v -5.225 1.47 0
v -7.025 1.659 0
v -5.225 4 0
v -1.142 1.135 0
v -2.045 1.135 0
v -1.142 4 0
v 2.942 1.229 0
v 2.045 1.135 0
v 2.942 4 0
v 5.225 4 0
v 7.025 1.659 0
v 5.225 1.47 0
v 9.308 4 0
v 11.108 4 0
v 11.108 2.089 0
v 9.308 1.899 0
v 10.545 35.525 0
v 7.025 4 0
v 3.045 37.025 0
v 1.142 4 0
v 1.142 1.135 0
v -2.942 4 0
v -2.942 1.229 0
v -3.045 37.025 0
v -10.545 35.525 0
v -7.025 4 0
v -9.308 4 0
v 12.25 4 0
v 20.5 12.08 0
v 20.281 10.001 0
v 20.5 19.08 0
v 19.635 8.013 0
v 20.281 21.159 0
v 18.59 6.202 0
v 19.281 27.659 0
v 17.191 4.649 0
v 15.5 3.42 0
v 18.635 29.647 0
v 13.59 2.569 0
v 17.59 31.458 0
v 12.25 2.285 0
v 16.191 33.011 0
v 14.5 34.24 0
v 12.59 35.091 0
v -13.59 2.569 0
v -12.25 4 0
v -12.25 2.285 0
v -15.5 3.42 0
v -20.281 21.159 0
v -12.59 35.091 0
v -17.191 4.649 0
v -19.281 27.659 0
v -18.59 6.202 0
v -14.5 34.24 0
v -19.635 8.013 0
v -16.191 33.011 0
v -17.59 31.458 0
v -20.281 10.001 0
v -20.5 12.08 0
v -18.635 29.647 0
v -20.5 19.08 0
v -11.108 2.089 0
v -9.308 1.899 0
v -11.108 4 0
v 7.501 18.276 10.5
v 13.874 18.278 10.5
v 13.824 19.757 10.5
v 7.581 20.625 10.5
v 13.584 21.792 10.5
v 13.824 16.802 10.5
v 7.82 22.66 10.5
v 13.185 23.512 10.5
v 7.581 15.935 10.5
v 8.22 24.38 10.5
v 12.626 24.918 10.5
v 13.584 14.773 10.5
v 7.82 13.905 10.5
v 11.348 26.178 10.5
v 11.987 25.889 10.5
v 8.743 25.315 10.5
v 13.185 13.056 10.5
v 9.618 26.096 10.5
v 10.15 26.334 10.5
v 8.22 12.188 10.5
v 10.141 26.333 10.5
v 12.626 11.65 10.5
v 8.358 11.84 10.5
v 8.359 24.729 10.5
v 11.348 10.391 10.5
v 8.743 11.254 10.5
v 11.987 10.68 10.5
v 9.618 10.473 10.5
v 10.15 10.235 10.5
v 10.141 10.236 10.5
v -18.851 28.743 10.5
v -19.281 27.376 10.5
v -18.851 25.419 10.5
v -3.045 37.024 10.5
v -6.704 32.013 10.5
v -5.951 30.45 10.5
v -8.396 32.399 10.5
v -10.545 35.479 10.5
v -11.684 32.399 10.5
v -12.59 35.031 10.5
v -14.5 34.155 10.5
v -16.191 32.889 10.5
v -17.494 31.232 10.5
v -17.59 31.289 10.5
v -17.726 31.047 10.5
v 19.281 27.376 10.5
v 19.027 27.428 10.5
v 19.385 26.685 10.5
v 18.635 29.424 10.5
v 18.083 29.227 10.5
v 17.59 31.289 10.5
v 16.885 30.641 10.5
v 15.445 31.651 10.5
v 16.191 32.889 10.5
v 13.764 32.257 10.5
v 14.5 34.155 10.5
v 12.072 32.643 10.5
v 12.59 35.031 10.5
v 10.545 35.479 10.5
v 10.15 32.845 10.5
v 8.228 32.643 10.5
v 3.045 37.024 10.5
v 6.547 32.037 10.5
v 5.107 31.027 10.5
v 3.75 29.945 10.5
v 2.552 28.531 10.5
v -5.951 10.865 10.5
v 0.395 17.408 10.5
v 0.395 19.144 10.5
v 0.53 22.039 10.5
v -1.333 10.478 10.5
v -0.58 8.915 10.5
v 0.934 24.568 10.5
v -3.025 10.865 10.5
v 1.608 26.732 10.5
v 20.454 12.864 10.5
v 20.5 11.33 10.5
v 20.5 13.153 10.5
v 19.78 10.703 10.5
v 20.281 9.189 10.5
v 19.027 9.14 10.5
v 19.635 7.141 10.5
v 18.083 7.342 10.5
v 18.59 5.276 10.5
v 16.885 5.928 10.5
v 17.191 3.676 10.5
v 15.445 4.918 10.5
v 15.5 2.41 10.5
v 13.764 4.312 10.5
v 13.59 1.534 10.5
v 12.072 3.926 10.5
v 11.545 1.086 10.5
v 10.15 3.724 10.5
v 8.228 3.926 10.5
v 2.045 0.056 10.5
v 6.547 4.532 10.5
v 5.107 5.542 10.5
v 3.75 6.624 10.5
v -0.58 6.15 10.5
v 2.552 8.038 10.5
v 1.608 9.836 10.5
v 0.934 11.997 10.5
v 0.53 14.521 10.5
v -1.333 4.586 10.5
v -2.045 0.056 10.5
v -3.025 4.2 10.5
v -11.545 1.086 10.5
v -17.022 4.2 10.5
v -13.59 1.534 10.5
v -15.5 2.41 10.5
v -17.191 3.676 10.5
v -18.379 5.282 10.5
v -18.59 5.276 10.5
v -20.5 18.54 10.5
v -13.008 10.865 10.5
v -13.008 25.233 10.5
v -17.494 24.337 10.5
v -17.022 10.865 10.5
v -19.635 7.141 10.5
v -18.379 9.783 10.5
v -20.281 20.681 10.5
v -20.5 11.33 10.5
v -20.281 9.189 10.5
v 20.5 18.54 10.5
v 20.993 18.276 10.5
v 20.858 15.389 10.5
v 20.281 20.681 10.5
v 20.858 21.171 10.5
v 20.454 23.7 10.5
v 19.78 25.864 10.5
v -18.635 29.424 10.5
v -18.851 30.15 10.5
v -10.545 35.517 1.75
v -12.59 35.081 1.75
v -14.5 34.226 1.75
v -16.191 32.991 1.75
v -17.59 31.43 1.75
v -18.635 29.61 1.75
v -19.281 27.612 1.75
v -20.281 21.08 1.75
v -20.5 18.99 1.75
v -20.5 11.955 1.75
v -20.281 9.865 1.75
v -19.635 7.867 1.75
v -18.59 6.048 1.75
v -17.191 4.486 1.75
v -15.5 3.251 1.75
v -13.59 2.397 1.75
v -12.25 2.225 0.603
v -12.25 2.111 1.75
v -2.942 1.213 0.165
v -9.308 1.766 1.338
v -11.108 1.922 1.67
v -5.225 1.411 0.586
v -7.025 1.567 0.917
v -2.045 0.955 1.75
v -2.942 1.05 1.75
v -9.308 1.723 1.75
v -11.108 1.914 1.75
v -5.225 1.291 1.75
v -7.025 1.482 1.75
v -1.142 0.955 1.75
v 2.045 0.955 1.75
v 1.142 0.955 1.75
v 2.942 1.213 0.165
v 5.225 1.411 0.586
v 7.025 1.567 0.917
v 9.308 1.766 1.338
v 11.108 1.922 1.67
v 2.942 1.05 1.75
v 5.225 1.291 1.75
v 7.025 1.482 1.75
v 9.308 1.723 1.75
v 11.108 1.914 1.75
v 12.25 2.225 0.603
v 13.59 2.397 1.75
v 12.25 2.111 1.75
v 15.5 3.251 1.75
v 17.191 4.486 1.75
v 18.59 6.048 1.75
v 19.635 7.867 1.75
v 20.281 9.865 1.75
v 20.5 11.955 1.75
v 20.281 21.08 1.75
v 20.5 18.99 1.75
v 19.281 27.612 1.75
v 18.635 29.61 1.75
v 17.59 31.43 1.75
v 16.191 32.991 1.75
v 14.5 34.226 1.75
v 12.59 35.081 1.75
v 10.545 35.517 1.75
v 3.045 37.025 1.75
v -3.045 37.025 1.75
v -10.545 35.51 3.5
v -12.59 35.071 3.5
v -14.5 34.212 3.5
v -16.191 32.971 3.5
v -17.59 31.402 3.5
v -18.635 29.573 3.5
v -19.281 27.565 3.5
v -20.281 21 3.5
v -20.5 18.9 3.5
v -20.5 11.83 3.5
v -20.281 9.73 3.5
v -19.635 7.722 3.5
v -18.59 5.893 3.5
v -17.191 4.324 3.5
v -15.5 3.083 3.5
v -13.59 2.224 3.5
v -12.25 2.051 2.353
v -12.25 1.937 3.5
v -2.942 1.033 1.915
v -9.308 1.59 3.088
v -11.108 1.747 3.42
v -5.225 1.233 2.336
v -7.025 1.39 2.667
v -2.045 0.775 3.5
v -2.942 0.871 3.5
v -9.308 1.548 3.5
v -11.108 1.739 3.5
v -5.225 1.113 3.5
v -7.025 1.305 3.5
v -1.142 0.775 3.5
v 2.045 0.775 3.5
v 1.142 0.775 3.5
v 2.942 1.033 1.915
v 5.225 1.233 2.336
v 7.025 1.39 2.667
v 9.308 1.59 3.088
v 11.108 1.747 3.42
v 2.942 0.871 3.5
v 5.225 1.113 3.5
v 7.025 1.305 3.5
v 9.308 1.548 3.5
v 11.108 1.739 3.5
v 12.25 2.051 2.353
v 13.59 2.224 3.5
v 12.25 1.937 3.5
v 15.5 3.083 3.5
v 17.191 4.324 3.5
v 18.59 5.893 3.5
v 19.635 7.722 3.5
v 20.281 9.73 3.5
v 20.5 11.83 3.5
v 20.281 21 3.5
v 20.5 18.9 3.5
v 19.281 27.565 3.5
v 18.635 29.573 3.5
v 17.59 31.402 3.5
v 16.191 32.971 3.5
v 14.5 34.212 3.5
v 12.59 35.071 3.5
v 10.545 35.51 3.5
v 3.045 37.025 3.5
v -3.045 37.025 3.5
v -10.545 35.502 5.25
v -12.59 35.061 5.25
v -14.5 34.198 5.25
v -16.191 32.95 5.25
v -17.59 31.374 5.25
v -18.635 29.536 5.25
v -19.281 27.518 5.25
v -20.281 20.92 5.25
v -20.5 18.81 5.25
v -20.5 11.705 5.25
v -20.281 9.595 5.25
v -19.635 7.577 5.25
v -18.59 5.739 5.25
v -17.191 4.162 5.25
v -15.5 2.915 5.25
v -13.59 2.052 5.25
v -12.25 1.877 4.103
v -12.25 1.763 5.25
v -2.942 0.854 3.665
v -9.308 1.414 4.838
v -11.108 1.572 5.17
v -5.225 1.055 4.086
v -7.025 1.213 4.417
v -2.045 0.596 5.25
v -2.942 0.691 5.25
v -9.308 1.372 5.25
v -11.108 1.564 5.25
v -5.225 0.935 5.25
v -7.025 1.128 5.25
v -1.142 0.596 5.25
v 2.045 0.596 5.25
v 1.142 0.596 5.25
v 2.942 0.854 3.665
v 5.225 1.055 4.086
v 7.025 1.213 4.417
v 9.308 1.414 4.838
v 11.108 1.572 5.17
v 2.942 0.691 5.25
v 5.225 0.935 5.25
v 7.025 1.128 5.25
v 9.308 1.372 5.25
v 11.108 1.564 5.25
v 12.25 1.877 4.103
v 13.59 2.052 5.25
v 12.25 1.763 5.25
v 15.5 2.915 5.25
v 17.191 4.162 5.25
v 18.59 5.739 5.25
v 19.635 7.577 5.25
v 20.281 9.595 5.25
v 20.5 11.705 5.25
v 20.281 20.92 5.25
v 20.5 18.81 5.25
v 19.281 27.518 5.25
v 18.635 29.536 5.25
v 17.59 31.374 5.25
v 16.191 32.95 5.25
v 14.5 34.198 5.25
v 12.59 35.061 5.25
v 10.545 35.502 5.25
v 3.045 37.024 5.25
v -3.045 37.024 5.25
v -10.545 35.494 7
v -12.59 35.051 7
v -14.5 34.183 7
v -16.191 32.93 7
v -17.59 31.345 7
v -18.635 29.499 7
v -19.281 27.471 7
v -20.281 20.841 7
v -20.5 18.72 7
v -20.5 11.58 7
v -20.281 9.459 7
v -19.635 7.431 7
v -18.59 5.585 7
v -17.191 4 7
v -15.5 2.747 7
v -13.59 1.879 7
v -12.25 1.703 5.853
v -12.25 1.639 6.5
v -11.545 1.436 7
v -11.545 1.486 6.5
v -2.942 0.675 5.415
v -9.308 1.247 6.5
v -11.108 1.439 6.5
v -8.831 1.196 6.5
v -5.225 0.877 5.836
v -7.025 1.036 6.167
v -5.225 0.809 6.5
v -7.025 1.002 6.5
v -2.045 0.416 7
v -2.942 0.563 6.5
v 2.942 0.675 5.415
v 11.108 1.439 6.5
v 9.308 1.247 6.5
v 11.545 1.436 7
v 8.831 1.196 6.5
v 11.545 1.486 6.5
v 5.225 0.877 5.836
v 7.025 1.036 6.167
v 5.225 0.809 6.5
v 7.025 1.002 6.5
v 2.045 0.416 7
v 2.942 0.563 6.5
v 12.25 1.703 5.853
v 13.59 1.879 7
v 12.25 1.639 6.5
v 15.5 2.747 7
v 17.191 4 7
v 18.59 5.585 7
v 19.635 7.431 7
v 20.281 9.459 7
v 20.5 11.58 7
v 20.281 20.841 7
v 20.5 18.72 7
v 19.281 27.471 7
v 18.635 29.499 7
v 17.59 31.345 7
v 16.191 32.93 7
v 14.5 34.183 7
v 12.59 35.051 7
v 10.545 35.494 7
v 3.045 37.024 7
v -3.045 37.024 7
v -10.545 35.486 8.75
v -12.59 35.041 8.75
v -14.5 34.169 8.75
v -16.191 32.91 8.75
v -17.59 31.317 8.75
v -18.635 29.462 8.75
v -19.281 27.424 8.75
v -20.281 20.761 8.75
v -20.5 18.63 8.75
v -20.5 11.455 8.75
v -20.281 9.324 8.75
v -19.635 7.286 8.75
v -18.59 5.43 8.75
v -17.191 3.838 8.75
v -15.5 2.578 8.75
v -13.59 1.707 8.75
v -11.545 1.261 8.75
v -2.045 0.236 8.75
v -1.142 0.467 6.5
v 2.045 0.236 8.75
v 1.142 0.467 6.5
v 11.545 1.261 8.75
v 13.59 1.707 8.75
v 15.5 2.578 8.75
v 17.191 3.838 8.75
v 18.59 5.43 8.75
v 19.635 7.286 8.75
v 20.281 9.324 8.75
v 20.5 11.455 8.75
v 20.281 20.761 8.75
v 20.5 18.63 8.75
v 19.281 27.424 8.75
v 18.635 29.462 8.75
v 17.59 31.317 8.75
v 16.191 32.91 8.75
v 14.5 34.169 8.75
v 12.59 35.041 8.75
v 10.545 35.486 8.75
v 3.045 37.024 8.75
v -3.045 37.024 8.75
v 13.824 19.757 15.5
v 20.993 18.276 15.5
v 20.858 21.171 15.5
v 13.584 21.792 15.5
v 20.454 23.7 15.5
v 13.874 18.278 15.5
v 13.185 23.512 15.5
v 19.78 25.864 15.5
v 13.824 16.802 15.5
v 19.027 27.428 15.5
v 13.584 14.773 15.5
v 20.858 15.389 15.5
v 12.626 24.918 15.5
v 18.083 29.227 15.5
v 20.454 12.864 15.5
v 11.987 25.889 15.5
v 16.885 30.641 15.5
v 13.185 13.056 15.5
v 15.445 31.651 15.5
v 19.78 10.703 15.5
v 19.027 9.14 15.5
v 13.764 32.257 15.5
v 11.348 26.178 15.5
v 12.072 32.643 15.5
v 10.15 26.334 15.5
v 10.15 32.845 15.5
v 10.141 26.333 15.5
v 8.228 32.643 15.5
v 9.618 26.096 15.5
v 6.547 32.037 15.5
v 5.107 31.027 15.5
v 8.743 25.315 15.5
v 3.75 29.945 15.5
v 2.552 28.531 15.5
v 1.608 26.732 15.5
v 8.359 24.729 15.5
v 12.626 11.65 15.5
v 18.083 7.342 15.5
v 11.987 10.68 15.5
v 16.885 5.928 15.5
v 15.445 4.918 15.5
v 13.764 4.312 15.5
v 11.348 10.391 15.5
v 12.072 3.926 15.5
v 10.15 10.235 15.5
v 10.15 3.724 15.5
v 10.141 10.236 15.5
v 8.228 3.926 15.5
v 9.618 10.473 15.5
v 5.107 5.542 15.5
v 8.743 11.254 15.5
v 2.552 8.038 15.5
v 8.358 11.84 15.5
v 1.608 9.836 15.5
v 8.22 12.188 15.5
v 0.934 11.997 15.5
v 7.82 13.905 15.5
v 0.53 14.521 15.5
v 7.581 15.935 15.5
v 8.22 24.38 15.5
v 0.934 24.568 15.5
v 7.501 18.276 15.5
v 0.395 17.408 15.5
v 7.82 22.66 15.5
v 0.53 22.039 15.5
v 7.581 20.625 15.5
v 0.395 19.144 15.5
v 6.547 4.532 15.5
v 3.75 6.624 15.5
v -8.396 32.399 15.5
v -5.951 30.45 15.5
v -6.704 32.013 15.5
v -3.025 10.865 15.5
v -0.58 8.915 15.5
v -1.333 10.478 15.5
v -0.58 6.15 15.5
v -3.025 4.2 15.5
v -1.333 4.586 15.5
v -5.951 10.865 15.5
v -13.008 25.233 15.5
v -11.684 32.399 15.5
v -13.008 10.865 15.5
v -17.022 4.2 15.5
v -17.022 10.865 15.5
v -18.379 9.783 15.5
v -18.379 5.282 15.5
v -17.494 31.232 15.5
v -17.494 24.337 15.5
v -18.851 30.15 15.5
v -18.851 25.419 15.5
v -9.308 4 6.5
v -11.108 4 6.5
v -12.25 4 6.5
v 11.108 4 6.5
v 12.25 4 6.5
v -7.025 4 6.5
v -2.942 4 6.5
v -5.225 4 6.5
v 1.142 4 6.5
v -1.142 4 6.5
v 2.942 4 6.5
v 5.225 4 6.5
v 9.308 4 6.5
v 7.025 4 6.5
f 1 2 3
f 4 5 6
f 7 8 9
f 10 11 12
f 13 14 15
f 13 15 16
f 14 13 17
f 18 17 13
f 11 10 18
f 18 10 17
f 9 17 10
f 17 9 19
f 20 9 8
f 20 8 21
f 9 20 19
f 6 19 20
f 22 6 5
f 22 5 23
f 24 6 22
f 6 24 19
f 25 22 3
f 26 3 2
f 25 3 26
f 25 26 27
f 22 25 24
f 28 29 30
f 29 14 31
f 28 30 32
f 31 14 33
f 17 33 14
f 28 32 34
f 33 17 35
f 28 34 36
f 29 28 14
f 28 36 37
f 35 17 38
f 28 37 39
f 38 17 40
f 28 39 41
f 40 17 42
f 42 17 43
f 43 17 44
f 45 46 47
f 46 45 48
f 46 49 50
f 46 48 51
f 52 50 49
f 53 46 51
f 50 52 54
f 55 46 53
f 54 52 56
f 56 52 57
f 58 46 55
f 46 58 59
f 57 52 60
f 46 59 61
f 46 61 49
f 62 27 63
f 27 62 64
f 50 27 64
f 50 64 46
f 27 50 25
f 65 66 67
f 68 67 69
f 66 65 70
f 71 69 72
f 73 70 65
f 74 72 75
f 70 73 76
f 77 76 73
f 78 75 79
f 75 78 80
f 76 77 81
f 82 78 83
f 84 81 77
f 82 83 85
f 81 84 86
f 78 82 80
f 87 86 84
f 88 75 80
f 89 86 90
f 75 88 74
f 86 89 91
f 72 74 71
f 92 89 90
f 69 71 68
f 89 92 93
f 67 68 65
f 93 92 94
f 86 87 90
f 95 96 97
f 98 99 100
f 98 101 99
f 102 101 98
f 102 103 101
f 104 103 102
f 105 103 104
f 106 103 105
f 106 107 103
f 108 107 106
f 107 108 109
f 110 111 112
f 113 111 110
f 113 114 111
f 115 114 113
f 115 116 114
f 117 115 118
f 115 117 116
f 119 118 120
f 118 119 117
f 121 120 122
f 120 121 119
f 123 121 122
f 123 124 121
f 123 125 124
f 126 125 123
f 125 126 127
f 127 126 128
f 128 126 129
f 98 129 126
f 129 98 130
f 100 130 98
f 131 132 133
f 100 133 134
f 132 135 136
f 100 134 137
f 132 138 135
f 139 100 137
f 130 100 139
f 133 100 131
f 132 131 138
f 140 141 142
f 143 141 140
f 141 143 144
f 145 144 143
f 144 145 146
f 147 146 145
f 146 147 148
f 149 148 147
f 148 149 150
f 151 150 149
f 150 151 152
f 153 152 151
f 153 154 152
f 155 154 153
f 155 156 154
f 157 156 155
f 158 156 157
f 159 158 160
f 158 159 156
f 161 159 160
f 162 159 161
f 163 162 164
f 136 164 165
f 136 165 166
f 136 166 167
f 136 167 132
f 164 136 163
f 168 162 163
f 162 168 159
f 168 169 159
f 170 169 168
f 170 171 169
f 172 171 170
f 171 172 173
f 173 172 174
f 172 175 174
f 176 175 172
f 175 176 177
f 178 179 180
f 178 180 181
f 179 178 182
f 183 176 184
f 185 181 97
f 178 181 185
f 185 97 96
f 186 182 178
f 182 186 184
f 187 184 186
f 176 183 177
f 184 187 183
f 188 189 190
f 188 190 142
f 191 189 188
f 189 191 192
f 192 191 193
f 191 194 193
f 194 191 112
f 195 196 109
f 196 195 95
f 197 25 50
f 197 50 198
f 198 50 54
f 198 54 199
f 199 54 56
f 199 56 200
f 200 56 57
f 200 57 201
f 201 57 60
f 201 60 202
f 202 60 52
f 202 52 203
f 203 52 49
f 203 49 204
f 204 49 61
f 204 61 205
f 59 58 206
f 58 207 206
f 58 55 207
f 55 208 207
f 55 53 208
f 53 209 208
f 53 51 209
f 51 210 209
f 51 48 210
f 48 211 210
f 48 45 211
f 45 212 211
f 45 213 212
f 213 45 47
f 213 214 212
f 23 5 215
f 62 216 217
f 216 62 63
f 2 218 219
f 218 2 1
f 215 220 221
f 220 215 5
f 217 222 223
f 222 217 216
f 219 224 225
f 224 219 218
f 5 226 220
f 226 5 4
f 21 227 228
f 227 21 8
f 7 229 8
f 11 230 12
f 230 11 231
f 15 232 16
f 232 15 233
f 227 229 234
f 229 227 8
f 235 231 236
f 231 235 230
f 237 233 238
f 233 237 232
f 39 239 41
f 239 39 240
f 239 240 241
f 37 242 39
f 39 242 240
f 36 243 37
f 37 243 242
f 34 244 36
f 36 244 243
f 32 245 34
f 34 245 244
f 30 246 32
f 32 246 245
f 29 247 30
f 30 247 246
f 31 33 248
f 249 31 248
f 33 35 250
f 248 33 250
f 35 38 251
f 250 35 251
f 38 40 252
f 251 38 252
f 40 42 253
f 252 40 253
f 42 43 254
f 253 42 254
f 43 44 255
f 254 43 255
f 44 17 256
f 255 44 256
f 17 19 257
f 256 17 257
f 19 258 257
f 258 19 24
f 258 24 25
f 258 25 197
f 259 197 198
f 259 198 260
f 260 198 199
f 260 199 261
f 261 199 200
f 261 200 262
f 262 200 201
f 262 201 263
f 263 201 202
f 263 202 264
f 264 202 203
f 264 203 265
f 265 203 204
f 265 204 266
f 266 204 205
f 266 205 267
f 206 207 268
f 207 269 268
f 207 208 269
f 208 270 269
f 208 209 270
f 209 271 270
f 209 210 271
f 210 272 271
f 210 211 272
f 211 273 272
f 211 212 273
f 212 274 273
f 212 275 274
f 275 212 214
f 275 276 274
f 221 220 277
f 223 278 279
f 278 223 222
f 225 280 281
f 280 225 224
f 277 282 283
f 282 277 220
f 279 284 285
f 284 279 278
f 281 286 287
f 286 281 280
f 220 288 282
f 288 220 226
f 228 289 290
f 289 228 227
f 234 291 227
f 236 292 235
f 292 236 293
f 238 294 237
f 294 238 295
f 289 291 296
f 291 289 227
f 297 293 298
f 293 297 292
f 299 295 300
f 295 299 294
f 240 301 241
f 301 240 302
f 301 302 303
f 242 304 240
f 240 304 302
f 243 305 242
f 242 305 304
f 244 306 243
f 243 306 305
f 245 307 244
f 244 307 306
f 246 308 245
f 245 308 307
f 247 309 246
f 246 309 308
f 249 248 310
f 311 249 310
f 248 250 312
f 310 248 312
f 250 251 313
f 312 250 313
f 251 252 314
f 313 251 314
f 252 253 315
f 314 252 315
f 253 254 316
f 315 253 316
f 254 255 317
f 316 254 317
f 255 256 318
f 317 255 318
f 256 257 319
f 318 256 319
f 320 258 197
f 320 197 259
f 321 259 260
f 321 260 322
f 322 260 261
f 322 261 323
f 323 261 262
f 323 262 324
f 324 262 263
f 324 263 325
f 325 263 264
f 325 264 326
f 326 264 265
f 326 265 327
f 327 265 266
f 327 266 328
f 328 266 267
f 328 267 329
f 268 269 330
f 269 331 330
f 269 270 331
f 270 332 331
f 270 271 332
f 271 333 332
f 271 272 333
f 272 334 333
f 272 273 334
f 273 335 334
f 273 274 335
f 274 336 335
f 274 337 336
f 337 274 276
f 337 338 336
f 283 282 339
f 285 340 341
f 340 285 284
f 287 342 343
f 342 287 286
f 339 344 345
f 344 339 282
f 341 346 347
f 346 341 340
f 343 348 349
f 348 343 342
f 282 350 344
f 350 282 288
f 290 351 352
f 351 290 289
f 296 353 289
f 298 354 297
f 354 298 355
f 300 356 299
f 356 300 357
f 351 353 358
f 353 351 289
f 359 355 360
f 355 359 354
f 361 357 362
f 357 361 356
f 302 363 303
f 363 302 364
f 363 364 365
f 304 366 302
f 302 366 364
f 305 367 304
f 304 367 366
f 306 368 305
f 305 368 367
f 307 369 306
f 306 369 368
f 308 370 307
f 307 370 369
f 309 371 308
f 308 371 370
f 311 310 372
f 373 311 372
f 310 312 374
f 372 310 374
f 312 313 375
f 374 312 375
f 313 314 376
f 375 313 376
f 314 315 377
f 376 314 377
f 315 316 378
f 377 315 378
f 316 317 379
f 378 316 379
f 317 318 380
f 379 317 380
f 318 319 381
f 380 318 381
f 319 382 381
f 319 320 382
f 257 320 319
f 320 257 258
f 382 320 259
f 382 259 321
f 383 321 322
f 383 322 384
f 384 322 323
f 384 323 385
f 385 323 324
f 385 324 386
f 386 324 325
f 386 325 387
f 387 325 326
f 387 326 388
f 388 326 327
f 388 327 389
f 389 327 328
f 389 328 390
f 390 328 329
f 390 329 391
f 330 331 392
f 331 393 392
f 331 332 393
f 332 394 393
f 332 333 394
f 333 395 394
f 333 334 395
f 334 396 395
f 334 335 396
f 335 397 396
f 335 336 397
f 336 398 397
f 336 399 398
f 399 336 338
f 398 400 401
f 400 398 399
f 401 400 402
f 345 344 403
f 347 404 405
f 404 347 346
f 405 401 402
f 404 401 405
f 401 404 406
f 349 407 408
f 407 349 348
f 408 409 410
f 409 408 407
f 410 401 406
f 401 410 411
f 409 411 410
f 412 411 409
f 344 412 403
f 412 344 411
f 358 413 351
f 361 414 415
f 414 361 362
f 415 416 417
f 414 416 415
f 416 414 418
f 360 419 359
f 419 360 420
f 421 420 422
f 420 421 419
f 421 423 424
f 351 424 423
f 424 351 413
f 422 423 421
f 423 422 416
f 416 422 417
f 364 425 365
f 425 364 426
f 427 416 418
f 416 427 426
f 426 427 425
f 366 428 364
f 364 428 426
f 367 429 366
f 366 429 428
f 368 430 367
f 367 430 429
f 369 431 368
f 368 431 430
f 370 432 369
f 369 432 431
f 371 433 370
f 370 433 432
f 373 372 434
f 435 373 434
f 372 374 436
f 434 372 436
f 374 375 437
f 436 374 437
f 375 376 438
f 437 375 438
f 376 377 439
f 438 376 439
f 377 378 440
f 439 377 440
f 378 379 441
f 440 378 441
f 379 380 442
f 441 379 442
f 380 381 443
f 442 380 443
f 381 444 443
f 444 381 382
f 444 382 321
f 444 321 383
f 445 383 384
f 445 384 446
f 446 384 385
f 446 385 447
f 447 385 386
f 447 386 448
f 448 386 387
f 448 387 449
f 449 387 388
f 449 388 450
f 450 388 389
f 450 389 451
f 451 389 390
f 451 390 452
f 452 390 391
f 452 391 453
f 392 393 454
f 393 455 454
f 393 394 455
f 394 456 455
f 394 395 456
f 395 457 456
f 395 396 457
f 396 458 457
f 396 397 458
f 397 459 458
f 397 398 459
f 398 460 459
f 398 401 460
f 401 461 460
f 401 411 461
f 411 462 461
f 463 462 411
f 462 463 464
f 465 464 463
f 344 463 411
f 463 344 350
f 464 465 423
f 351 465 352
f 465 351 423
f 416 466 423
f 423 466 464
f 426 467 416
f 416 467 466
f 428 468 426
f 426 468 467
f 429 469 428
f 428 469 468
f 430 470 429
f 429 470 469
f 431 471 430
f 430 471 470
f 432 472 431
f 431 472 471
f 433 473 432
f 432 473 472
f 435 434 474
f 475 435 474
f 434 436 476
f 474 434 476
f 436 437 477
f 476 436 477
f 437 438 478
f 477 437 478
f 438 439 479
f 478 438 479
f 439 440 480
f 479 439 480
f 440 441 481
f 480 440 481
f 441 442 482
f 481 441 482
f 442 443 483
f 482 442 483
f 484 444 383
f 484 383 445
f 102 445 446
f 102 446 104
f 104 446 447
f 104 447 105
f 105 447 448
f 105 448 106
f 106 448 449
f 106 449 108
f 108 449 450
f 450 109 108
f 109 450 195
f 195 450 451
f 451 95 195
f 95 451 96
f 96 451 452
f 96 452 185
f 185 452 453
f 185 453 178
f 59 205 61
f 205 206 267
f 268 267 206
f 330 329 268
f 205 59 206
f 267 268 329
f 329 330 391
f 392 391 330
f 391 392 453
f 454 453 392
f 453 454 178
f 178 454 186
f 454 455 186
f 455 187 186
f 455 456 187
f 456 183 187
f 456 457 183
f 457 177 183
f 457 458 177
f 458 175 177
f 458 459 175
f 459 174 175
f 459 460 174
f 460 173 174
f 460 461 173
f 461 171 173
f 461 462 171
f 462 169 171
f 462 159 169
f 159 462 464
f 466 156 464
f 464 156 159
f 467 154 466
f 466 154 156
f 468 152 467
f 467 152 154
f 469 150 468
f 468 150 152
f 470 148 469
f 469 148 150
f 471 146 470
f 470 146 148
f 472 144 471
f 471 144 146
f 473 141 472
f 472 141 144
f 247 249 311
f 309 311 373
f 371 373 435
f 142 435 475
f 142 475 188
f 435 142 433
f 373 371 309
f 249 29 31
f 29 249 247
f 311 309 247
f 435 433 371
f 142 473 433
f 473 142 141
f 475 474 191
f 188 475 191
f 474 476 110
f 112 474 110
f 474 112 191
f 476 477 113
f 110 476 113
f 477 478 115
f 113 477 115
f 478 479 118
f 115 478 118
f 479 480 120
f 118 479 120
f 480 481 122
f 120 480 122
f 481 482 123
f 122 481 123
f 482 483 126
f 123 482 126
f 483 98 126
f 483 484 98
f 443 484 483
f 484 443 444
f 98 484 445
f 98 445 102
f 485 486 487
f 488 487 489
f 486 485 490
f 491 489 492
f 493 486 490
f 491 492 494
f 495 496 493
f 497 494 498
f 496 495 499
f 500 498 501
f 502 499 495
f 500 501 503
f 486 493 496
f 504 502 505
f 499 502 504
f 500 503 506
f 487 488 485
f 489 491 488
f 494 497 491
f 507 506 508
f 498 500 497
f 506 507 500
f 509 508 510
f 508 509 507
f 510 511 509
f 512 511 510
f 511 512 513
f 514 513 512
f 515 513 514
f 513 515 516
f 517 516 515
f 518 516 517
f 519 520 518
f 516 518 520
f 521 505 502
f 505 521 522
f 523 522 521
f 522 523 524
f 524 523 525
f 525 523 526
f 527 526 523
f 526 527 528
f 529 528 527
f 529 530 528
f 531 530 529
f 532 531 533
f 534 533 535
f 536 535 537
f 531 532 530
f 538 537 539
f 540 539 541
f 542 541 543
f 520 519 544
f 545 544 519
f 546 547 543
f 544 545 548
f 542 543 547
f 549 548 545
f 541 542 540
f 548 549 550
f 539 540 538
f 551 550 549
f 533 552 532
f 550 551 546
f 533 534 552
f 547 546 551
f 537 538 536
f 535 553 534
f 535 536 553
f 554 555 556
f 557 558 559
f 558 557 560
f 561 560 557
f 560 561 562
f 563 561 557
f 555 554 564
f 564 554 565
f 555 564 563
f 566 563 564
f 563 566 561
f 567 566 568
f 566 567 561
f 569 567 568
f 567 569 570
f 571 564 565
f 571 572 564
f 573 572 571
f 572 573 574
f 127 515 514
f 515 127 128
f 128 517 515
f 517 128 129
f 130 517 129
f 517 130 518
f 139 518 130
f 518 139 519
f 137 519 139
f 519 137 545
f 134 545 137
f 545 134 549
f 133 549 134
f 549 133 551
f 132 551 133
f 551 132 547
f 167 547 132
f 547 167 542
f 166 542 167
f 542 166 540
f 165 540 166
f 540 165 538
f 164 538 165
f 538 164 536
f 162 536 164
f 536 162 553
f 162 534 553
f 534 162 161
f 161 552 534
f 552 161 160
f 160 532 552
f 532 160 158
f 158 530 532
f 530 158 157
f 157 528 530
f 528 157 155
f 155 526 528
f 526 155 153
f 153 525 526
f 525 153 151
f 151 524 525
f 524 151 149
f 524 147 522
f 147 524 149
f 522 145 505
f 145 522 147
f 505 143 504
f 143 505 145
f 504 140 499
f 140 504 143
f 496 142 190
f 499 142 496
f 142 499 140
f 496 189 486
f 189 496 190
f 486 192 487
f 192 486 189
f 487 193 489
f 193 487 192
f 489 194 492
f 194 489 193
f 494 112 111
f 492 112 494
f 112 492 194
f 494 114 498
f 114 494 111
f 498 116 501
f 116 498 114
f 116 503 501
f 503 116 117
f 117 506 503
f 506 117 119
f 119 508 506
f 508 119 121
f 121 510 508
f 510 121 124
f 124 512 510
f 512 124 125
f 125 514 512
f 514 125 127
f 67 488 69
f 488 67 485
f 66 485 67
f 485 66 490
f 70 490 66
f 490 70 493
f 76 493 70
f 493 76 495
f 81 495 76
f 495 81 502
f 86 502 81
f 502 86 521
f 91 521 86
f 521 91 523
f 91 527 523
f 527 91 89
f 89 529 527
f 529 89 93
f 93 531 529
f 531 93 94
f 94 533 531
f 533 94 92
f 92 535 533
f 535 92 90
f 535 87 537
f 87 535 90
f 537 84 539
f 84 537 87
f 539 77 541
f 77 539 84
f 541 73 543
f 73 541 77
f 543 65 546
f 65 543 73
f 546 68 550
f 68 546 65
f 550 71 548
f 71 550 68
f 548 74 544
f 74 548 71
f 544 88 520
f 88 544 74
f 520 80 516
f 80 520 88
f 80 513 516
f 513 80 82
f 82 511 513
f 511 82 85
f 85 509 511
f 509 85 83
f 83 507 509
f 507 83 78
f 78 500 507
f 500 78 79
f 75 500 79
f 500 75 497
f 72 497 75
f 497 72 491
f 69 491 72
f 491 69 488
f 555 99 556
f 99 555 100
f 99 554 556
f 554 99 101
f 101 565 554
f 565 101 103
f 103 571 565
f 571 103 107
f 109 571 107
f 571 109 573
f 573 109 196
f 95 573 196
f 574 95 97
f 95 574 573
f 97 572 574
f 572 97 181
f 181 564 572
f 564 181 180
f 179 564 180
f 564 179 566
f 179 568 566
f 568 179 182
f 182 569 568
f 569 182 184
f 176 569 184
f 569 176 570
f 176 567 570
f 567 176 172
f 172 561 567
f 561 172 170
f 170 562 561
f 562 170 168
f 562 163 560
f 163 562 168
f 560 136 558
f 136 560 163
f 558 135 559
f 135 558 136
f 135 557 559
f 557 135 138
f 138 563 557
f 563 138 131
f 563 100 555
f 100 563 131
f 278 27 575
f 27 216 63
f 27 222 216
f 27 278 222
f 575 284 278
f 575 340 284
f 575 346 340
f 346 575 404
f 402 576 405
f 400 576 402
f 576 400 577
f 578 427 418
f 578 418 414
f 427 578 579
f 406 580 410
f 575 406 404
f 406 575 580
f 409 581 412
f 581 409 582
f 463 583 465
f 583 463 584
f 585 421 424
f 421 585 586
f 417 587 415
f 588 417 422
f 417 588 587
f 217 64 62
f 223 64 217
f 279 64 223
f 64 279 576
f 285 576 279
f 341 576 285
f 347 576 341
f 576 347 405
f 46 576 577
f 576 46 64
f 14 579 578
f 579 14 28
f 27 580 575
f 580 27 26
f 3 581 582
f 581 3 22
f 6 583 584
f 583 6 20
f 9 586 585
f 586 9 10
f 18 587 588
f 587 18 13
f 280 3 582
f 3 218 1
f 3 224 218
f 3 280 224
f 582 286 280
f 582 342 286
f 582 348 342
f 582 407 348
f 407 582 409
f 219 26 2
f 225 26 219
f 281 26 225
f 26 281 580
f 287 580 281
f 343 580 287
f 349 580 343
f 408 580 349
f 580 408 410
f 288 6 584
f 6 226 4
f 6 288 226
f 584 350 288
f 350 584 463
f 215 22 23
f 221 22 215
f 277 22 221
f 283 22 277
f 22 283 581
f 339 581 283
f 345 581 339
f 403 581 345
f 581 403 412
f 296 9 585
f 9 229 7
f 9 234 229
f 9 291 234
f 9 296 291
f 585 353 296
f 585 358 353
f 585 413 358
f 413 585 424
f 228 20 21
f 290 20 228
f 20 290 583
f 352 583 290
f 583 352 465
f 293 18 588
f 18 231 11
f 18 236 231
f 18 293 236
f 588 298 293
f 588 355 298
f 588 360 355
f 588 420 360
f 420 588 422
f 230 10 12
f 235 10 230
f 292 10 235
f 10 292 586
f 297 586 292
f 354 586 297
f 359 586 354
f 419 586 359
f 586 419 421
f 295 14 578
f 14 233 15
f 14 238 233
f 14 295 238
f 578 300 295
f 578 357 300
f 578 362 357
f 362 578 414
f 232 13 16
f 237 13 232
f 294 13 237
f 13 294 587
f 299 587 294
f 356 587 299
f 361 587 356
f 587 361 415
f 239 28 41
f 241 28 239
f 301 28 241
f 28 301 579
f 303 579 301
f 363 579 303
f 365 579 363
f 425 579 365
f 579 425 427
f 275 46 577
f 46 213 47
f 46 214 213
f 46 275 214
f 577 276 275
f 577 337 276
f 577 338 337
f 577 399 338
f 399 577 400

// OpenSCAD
// Base tile (not including extruded text).
tile_size = [41, 36, 10.5];
// Key cutout box size.
key_area_size = [24.5, 4, 6.5];
// Individual key size.
key_size = [1.8, 4, 6.5];
// Radius of circle used for minkowski function.
radius = 10;

// Text
font = "Cantarell Bold";
text_size = 24;
// Extrusion height
text_depth = 5;
// Radius of circle used for minkowski function.
text_radius = 2;

tile_blank = [[0,0,0,0,0,0], " "];

tile_a =  [[1,0,0,0,0,1], "A"];
tile_b =  [[1,0,0,1,0,1], "B"];
tile_c =  [[1,0,1,0,0,1], "C"];
tile_d =  [[1,0,1,1,0,1], "D"];
tile_e =  [[1,0,0,0,1,0], "E"];
tile_f =  [[1,0,0,1,1,0], "F"];
tile_g =  [[1,0,1,0,1,0], "G"];
tile_h =  [[1,0,1,1,1,0], "H"];
tile_i =  [[1,0,0,0,1,1], "I"];
tile_j =  [[1,0,0,1,1,1], "J"];
tile_k =  [[1,0,1,0,1,1], "K"];
tile_l =  [[1,0,1,1,1,1], "L"];
tile_m =  [[0,1,0,0,0,1], "M"];
tile_n =  [[0,1,0,1,0,1], "N"];
tile_o =  [[0,1,1,0,0,1], "O"];
tile_p =  [[0,1,1,1,0,1], "P"];
tile_q =  [[0,1,0,0,1,0], "Q"];
tile_r =  [[0,1,0,1,1,0], "R"];
tile_s =  [[0,1,1,0,1,0], "S"];
tile_t =  [[0,1,1,1,1,0], "T"];
tile_u =  [[0,1,0,0,1,1], "U"];
tile_v =  [[0,1,0,1,1,1], "V"];
tile_w =  [[0,1,1,0,1,1], "W"];
tile_x =  [[0,1,1,1,1,1], "X"];
tile_y =  [[1,1,0,0,0,1], "Y"];
tile_z =  [[1,1,0,1,0,1], "Z"];

tile_1 =  [[1,1,1,0,0,1], "1"];
tile_2 =  [[1,1,1,1,0,1], "2"];
tile_3 =  [[1,1,0,0,1,0], "3"];
tile_4 =  [[1,1,0,1,1,0], "4"];
tile_5 =  [[1,1,1,0,1,0], "5"];
tile_6 =  [[1,1,1,1,1,0], "6"];
tile_7 =  [[1,1,0,0,1,1], "7"];
tile_8 =  [[1,1,0,1,1,1], "8"];
tile_9 =  [[1,1,1,0,1,1], "9"];
tile_10 = [[1,1,1,1,1,1], "10"];

// This variable can be set on the command line.
which_tile=tile_10;

// Build the tile.
tile(which_tile);

module half_tile_poly() {
    left=0;
    right=tile_size[0]/2-radius;
    bottom=radius;
    top=tile_size[1]-radius;
    mid=(top+bottom)/2;
    mirror([1,0,0]) polygon([[left, bottom], [left+1, bottom], [right, bottom+1], [right, mid], [right-1, top-1.5], [left+2,top], [left,top]]);
}

module tile_poly() {
    union() {
        half_tile_poly();
        mirror([1,0,0]) half_tile_poly();
    }
}

module tile_2d() {
    minkowski()
    {
        tile_poly();
        circle(r=radius);
    }
}

module tile_3d(txt) {
    union() {
        scale=1.03;
        translate([0, tile_size[1]*scale]) linear_extrude(height=tile_size[2], scale=[1,scale])
            translate([0, -tile_size[1]]) tile_2d();
        translate([0,tile_size[1]/2,tile_size[2]])
            linear_extrude(height=text_depth)
                minkowski() {
                    text(txt, halign="center", valign="center", size=text_size, font=font);
                    circle(r=text_radius);
                }
    };
}

module keys(bits) {
    key_space=key_area_size[0] / 6;
    offset = (key_space - key_size[0])/2;
    for (k=[0:5])
        if(bits[k]) {
            key_pos = key_space * k + offset;
            translate([key_pos, 0, 0])
            cube(key_size, center=false);
        }
}

module key_area_neg(bits) {
    translate([-key_area_size[0]/2,0,0])
    difference() {
        cube(key_area_size, center=false);
        keys(bits);
    };
}

module tile(info) {
    difference() {
        tile_3d(info[1]);
        key_area_neg(info[0]);
    };
}
